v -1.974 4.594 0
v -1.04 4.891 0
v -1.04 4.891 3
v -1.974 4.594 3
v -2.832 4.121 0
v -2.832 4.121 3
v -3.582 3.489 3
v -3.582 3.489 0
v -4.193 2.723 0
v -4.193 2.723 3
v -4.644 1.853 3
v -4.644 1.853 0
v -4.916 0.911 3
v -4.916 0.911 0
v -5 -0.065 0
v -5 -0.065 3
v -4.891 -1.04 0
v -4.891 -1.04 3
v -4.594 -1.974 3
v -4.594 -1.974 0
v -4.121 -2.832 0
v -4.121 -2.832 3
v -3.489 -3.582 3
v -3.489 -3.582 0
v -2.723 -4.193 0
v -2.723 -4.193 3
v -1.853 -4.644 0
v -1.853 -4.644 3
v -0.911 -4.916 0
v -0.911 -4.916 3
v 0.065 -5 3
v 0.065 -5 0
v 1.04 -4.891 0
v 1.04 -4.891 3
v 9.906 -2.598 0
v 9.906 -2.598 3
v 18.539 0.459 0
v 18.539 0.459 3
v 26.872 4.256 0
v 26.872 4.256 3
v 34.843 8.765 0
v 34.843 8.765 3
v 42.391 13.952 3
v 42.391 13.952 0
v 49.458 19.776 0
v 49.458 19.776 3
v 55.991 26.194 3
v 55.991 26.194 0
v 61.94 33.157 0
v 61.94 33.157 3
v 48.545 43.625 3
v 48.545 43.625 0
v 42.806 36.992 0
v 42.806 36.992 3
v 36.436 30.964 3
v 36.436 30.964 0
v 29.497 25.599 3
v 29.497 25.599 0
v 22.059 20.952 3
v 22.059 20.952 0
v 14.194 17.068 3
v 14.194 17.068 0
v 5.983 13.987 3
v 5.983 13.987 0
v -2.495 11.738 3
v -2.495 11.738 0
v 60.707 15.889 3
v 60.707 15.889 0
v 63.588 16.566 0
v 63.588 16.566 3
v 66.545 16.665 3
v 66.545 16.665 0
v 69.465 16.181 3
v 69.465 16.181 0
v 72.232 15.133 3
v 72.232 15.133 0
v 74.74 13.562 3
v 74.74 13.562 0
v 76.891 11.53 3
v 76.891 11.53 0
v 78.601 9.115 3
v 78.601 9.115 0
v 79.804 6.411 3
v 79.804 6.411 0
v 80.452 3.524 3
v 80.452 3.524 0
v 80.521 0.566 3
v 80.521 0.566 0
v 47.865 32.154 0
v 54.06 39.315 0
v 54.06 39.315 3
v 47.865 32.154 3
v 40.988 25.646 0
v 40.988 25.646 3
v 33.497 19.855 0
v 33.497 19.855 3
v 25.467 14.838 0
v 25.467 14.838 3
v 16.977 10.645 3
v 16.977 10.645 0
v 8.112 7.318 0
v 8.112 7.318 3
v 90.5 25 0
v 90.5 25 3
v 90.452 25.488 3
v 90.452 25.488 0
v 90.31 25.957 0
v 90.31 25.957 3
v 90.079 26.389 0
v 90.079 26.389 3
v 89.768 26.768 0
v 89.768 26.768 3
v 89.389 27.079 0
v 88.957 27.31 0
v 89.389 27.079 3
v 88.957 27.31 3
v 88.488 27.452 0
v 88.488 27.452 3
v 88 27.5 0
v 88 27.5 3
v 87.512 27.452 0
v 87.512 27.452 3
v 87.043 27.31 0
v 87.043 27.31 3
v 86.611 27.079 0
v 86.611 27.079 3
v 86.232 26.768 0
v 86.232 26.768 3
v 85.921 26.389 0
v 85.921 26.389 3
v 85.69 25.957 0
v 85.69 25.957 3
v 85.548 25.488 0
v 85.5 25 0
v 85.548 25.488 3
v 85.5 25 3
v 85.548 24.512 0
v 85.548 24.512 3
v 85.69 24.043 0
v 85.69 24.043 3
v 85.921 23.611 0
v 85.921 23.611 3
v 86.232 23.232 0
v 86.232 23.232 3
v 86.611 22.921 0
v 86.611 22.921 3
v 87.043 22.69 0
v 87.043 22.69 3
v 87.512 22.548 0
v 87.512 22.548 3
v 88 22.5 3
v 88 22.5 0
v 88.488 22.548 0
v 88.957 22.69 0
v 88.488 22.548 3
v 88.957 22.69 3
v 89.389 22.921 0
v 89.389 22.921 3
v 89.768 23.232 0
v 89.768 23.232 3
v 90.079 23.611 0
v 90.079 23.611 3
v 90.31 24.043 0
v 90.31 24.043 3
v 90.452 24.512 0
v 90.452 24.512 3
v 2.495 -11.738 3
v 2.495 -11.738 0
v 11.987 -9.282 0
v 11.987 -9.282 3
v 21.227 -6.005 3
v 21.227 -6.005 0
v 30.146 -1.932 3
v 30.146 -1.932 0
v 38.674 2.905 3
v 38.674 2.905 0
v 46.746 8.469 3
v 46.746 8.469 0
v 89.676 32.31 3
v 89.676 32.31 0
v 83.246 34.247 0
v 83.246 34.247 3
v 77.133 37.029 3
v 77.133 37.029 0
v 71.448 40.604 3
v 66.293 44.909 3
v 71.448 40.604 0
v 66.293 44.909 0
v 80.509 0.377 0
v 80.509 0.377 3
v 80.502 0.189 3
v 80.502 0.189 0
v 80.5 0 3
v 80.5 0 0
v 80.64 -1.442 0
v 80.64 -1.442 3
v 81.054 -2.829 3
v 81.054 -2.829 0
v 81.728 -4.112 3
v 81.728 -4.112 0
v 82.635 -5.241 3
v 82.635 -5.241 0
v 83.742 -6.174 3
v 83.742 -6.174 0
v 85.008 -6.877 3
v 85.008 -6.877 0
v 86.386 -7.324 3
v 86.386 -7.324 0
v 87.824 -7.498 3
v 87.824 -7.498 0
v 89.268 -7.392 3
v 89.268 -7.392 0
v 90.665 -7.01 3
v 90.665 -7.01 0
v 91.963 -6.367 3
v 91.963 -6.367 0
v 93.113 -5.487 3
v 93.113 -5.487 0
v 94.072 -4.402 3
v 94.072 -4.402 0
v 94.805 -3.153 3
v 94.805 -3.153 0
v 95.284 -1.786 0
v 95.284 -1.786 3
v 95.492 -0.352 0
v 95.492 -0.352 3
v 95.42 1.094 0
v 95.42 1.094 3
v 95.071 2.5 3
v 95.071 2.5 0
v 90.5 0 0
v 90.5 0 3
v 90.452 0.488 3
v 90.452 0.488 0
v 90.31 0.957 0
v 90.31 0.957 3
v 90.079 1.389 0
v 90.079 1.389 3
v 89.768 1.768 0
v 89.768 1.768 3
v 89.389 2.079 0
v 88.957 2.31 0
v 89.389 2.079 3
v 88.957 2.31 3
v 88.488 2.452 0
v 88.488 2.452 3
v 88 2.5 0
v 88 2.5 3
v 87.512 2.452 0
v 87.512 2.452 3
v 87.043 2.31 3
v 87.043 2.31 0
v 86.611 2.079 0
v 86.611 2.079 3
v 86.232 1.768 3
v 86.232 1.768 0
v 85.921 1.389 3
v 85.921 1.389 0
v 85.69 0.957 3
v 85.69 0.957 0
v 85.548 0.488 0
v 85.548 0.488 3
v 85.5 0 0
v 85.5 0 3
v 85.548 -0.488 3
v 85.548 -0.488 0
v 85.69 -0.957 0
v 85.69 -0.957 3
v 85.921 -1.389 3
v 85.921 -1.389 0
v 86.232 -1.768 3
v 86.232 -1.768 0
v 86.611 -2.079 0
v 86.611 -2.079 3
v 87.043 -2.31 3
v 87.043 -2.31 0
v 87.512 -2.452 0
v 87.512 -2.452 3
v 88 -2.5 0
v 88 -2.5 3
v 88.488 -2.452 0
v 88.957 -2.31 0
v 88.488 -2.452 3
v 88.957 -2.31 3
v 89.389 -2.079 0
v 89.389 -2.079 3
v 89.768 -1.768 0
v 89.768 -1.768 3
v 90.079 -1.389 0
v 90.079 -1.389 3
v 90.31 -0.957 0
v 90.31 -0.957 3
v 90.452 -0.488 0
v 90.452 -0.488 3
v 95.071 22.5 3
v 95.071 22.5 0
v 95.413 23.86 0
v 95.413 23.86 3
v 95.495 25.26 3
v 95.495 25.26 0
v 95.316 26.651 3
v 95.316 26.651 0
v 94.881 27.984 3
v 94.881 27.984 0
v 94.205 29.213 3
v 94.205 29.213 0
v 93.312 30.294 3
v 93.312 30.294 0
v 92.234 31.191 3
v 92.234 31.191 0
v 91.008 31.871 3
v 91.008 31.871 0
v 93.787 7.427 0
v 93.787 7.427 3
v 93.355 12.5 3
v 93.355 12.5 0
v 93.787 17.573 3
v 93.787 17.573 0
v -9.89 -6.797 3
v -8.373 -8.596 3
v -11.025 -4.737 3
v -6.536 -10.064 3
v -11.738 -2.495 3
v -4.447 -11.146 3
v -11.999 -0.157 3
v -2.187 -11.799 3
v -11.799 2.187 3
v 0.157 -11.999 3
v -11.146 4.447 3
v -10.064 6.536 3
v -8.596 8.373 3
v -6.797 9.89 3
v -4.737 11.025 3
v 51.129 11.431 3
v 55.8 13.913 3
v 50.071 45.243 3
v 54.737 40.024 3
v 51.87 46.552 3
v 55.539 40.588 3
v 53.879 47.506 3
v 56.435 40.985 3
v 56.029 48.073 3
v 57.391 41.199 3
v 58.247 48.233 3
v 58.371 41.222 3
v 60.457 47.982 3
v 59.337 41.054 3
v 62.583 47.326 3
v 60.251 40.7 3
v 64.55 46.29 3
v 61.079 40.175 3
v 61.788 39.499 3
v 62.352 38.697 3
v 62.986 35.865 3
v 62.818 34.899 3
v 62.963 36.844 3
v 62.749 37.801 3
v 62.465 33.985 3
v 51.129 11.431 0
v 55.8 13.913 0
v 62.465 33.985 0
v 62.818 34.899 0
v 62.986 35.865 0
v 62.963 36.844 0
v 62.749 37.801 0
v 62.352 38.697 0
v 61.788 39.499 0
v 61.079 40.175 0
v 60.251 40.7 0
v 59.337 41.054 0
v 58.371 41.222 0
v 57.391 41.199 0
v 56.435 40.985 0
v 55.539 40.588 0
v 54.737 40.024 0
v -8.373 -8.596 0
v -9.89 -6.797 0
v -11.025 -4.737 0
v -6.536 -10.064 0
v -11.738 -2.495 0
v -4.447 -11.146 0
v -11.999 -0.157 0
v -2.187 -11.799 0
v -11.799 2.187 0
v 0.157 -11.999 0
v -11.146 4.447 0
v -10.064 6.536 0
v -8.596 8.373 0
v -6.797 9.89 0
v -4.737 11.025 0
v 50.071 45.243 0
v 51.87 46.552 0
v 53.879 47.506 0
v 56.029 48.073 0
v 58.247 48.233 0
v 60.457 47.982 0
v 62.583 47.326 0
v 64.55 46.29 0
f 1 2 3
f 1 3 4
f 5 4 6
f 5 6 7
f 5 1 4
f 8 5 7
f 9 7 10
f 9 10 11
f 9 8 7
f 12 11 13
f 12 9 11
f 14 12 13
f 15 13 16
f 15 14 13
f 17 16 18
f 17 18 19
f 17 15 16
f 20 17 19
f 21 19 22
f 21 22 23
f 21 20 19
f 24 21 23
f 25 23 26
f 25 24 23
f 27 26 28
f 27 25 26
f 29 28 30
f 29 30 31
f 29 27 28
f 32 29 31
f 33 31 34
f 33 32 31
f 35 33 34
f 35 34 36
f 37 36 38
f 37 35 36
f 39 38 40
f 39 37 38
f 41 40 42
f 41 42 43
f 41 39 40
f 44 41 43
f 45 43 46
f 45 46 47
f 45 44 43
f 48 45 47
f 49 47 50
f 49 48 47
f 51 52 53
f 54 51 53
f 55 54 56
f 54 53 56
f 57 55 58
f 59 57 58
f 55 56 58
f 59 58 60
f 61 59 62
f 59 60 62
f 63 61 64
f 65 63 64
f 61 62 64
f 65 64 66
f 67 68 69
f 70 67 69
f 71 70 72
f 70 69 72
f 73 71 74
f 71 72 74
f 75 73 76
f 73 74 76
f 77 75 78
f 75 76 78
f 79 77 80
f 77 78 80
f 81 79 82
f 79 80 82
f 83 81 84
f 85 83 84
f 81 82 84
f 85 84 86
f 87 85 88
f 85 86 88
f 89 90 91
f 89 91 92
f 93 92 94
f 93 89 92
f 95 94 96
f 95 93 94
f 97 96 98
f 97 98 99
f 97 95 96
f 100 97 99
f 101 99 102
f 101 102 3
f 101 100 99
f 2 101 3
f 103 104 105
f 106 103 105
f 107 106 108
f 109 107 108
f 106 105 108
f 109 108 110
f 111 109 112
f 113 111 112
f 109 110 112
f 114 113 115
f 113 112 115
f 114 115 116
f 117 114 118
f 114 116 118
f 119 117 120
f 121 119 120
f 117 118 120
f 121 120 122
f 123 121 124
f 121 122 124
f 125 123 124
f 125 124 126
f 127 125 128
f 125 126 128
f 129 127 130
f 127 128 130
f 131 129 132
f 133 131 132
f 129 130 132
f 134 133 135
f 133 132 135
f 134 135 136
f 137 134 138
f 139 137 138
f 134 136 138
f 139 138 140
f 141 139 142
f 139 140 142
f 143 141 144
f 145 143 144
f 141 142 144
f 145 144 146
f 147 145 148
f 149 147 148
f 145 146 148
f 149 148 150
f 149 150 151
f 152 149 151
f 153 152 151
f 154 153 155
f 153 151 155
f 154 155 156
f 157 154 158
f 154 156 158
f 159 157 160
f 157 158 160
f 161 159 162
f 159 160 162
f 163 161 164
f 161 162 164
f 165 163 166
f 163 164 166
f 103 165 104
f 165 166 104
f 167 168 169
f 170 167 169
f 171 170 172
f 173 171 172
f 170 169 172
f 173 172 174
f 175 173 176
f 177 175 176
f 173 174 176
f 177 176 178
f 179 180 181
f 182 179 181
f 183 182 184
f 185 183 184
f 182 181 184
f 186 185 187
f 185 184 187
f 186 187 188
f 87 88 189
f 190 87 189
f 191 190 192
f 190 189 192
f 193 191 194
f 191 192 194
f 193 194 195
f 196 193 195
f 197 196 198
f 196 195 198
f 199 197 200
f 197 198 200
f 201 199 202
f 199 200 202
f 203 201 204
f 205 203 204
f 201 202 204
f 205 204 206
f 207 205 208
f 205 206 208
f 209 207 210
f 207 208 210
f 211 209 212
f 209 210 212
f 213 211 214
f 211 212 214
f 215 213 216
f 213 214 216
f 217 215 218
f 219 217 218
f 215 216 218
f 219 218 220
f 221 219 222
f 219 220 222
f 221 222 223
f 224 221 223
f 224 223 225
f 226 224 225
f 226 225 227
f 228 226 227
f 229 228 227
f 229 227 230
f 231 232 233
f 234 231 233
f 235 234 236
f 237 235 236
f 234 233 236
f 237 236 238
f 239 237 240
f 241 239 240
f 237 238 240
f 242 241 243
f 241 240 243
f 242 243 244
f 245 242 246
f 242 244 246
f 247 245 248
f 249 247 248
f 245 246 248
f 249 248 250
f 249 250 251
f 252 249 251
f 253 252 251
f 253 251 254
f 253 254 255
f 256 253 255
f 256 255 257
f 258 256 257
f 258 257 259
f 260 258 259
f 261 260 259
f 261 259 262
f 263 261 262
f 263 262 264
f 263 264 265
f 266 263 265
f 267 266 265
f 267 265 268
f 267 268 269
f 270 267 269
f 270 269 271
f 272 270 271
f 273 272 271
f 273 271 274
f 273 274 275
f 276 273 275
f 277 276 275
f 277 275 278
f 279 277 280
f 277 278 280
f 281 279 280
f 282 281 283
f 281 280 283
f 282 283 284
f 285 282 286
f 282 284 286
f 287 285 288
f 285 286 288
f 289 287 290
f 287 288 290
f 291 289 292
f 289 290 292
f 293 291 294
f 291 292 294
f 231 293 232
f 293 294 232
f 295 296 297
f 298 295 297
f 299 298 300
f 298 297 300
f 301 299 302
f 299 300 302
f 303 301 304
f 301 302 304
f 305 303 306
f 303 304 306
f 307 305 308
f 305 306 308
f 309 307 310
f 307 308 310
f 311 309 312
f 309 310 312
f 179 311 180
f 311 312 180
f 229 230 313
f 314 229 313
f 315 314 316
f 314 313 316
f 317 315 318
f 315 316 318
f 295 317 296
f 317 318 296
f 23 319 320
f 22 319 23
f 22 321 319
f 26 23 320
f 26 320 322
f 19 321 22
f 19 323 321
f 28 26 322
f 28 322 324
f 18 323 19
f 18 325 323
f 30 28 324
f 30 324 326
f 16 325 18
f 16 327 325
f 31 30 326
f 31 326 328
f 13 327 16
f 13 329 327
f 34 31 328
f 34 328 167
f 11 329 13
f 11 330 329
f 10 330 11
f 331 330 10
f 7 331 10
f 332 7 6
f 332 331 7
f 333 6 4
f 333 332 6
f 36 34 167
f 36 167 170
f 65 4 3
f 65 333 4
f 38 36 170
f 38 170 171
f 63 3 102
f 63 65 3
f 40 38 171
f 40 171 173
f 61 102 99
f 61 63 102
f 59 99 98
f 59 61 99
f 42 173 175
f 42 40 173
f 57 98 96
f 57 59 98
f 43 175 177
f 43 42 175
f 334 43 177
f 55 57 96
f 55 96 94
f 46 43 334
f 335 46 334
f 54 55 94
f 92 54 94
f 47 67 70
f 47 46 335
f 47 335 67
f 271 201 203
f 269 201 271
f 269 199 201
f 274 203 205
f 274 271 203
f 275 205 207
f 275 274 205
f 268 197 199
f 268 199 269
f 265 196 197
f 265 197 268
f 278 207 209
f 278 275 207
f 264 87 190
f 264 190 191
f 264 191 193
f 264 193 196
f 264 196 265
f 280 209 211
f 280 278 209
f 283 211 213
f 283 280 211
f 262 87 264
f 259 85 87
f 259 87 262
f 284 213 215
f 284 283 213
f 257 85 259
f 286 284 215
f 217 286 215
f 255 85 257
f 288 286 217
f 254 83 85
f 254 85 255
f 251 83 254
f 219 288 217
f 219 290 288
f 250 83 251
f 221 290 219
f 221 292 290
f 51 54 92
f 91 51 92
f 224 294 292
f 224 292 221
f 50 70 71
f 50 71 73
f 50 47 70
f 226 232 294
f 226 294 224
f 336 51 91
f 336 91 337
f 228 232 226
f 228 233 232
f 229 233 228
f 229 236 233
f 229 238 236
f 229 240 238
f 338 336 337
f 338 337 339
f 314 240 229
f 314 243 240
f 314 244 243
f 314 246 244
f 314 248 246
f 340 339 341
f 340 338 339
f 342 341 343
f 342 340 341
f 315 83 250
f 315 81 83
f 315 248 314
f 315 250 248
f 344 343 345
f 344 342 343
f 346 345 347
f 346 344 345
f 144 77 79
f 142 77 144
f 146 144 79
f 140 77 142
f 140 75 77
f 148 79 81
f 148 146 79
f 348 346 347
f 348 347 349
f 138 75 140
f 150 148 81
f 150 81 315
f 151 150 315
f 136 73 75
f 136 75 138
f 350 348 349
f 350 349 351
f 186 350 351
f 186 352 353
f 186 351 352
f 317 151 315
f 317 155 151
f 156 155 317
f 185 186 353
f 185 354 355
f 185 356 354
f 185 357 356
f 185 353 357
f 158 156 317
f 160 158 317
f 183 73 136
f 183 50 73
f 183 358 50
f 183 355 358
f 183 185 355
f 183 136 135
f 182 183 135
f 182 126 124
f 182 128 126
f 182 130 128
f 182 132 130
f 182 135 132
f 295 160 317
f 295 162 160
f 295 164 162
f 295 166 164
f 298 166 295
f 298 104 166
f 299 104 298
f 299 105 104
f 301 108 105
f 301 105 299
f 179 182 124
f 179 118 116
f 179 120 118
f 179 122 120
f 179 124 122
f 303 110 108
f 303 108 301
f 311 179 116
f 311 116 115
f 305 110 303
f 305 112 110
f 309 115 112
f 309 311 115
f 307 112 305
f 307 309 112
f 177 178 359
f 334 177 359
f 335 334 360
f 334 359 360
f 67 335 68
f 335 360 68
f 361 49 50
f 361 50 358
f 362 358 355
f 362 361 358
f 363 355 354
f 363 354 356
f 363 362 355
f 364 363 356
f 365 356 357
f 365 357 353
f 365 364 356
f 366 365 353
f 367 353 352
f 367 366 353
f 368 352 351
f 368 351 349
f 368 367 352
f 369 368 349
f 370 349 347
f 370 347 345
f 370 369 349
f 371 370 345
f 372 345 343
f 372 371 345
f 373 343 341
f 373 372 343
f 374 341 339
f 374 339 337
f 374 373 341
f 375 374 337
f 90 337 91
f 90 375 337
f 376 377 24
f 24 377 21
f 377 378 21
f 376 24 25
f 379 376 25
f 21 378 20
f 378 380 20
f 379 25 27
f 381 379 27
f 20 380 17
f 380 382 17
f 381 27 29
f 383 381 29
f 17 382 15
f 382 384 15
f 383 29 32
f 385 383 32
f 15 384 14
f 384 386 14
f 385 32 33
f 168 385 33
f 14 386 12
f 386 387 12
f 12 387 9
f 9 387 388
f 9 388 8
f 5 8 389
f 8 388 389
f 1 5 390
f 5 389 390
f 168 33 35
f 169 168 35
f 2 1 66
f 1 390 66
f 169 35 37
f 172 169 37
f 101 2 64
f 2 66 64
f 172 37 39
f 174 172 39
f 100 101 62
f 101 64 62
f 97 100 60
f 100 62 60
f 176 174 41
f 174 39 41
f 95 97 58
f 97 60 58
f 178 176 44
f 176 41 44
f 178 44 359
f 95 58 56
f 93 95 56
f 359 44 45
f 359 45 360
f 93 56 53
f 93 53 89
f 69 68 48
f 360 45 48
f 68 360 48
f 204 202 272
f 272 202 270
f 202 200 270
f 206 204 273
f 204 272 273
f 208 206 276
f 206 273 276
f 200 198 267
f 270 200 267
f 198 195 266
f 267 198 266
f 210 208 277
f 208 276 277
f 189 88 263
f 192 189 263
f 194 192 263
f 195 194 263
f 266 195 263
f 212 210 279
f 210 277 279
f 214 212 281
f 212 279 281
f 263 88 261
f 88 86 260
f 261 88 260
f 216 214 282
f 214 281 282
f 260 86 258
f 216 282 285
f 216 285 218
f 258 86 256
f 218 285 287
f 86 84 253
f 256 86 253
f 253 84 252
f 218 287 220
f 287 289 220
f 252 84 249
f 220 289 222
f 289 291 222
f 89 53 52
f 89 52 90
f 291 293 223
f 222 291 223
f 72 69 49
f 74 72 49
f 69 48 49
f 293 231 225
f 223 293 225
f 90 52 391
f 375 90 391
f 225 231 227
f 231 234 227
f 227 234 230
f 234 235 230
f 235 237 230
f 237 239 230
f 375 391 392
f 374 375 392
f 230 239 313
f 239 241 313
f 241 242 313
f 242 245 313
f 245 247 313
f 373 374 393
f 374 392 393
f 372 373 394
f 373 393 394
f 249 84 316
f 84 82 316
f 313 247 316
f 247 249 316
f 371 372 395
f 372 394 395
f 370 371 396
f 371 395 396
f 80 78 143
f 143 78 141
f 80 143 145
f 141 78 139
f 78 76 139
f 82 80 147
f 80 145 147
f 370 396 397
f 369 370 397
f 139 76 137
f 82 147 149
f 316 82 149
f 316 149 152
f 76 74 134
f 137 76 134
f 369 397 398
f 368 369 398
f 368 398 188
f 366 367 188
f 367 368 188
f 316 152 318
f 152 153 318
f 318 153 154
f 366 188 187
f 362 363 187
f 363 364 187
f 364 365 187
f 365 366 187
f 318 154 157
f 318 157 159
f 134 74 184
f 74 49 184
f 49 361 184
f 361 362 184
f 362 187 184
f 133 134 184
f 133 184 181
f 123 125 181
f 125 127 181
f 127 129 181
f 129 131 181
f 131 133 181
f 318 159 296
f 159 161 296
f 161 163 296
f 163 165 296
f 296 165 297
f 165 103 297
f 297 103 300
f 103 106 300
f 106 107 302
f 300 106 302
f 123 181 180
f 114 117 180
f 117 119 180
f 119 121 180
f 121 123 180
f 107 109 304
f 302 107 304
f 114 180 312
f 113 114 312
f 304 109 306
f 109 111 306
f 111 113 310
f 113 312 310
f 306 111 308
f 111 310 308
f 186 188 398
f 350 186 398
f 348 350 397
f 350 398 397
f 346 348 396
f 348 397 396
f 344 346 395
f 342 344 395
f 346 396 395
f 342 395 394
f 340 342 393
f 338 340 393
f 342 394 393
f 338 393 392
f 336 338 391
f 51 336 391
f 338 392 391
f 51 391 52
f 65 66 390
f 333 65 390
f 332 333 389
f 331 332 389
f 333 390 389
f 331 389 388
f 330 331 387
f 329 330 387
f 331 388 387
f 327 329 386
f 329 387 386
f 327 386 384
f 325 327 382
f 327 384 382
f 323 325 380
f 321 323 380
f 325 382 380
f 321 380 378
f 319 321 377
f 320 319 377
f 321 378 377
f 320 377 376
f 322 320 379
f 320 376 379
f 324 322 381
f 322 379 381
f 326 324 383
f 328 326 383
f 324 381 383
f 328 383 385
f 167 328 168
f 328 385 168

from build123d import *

# Parameters (mm, degrees)
EXTRUDE_1_DEPTH     = 3
EXTRUDE_2_DEPTH     = 3
SKETCH_3_R          = 2.5
CUT_EXTRUDE_1_DEPTH = 3
EXTRUDE_3_DEPTH     = 3
SKETCH_5_R          = 2.5
CUT_EXTRUDE_2_DEPTH = 108.032497136


with BuildPart() as part:
    # 草图1 → 凸台-拉伸1 (new body)
    with BuildSketch(Plane.XY):
        with BuildLine():
            ThreePointArc((-2.49494029, 11.737771209), (-11.737771209, -2.49494029), (2.49494029, -11.737771209))
            ThreePointArc((2.49494029, -11.737771209), (38.552147634, 2.82859918), (67.45494029, 28.846476198))
            ThreePointArc((67.45494029, 28.846476198), (65.389458987, 45.690875474), (48.54505971, 43.625394171))
            ThreePointArc((48.54505971, 43.625394171), (25.835722623, 23.182776515), (-2.49494029, 11.737771209))
        make_face()
        with BuildLine():
            ThreePointArc((61.939558454, 33.15699394), (34.843190339, 8.765234236), (1.039558454, -4.890738004))
            ThreePointArc((1.039558454, -4.890738004), (-4.890738004, -1.039558454), (-1.039558454, 4.890738004))
            ThreePointArc((-1.039558454, 4.890738004), (29.544679918, 17.246141459), (54.060441546, 39.314876429))
            ThreePointArc((54.060441546, 39.314876429), (61.078941244, 40.175493638), (61.939558454, 33.15699394))
        make_face(mode=Mode.SUBTRACT)
    extrude(amount=EXTRUDE_1_DEPTH)

    # 草图2 → 凸台-拉伸2 (add)
    with BuildSketch(Plane.XY):
        with BuildLine():
            ThreePointArc((89.676000633, 32.310336646), (77.132851548, 37.028551056), (66.293420251, 44.908834385))
            ThreePointArc((66.293420251, 44.908834385), (69.968747349, 37.101433246), (67.45494029, 28.846476198))
            ThreePointArc((67.45494029, 28.846476198), (57.764135997, 17.983287307), (46.746204448, 8.468785476))
            ThreePointArc((46.746204448, 8.468785476), (65.669563572, 17.30537468), (86.551758878, 17.641155141))
            ThreePointArc((86.551758878, 17.641155141), (95.33547477, 23.437690844), (89.676000633, 32.310336646))
        make_face()
    extrude(amount=EXTRUDE_2_DEPTH)

    # 草图3 → 切除-拉伸1 (cut)
    with BuildSketch(Plane.XY.offset(3)):
        with Locations((88, 25)):
            Circle(SKETCH_3_R)
    extrude(amount=-CUT_EXTRUDE_1_DEPTH, mode=Mode.SUBTRACT)

    # 草图4 → 凸台-拉伸3 (add)
    with BuildSketch(Plane.XY):
        with BuildLine():
            ThreePointArc((80.52135397, 0.56555597), (88.988457626, -7.4345781), (95.071067795, 2.500000049))
            ThreePointArc((95.071067795, 2.500000049), (93.355339059, 12.500000074), (95.071067844, 22.500000091))
            ThreePointArc((95.071067844, 22.500000091), (91.715661231, 18.485104635), (86.551758798, 17.641155157))
            ThreePointArc((86.551758798, 17.641155157), (73.513996149, 18.467623485), (60.707166945, 15.888586743))
            ThreePointArc((60.707166945, 15.888586743), (74.740298782, 13.562445033), (80.52135397, 0.56555597))
        make_face()
    extrude(amount=EXTRUDE_3_DEPTH)

    # 草图5 → 切除-拉伸2 (cut, through all)
    with BuildSketch(Plane.XY.offset(3)):
        with Locations((88, 0)):
            Circle(SKETCH_5_R)
    extrude(amount=-CUT_EXTRUDE_2_DEPTH, mode=Mode.SUBTRACT)


solid = part.part
